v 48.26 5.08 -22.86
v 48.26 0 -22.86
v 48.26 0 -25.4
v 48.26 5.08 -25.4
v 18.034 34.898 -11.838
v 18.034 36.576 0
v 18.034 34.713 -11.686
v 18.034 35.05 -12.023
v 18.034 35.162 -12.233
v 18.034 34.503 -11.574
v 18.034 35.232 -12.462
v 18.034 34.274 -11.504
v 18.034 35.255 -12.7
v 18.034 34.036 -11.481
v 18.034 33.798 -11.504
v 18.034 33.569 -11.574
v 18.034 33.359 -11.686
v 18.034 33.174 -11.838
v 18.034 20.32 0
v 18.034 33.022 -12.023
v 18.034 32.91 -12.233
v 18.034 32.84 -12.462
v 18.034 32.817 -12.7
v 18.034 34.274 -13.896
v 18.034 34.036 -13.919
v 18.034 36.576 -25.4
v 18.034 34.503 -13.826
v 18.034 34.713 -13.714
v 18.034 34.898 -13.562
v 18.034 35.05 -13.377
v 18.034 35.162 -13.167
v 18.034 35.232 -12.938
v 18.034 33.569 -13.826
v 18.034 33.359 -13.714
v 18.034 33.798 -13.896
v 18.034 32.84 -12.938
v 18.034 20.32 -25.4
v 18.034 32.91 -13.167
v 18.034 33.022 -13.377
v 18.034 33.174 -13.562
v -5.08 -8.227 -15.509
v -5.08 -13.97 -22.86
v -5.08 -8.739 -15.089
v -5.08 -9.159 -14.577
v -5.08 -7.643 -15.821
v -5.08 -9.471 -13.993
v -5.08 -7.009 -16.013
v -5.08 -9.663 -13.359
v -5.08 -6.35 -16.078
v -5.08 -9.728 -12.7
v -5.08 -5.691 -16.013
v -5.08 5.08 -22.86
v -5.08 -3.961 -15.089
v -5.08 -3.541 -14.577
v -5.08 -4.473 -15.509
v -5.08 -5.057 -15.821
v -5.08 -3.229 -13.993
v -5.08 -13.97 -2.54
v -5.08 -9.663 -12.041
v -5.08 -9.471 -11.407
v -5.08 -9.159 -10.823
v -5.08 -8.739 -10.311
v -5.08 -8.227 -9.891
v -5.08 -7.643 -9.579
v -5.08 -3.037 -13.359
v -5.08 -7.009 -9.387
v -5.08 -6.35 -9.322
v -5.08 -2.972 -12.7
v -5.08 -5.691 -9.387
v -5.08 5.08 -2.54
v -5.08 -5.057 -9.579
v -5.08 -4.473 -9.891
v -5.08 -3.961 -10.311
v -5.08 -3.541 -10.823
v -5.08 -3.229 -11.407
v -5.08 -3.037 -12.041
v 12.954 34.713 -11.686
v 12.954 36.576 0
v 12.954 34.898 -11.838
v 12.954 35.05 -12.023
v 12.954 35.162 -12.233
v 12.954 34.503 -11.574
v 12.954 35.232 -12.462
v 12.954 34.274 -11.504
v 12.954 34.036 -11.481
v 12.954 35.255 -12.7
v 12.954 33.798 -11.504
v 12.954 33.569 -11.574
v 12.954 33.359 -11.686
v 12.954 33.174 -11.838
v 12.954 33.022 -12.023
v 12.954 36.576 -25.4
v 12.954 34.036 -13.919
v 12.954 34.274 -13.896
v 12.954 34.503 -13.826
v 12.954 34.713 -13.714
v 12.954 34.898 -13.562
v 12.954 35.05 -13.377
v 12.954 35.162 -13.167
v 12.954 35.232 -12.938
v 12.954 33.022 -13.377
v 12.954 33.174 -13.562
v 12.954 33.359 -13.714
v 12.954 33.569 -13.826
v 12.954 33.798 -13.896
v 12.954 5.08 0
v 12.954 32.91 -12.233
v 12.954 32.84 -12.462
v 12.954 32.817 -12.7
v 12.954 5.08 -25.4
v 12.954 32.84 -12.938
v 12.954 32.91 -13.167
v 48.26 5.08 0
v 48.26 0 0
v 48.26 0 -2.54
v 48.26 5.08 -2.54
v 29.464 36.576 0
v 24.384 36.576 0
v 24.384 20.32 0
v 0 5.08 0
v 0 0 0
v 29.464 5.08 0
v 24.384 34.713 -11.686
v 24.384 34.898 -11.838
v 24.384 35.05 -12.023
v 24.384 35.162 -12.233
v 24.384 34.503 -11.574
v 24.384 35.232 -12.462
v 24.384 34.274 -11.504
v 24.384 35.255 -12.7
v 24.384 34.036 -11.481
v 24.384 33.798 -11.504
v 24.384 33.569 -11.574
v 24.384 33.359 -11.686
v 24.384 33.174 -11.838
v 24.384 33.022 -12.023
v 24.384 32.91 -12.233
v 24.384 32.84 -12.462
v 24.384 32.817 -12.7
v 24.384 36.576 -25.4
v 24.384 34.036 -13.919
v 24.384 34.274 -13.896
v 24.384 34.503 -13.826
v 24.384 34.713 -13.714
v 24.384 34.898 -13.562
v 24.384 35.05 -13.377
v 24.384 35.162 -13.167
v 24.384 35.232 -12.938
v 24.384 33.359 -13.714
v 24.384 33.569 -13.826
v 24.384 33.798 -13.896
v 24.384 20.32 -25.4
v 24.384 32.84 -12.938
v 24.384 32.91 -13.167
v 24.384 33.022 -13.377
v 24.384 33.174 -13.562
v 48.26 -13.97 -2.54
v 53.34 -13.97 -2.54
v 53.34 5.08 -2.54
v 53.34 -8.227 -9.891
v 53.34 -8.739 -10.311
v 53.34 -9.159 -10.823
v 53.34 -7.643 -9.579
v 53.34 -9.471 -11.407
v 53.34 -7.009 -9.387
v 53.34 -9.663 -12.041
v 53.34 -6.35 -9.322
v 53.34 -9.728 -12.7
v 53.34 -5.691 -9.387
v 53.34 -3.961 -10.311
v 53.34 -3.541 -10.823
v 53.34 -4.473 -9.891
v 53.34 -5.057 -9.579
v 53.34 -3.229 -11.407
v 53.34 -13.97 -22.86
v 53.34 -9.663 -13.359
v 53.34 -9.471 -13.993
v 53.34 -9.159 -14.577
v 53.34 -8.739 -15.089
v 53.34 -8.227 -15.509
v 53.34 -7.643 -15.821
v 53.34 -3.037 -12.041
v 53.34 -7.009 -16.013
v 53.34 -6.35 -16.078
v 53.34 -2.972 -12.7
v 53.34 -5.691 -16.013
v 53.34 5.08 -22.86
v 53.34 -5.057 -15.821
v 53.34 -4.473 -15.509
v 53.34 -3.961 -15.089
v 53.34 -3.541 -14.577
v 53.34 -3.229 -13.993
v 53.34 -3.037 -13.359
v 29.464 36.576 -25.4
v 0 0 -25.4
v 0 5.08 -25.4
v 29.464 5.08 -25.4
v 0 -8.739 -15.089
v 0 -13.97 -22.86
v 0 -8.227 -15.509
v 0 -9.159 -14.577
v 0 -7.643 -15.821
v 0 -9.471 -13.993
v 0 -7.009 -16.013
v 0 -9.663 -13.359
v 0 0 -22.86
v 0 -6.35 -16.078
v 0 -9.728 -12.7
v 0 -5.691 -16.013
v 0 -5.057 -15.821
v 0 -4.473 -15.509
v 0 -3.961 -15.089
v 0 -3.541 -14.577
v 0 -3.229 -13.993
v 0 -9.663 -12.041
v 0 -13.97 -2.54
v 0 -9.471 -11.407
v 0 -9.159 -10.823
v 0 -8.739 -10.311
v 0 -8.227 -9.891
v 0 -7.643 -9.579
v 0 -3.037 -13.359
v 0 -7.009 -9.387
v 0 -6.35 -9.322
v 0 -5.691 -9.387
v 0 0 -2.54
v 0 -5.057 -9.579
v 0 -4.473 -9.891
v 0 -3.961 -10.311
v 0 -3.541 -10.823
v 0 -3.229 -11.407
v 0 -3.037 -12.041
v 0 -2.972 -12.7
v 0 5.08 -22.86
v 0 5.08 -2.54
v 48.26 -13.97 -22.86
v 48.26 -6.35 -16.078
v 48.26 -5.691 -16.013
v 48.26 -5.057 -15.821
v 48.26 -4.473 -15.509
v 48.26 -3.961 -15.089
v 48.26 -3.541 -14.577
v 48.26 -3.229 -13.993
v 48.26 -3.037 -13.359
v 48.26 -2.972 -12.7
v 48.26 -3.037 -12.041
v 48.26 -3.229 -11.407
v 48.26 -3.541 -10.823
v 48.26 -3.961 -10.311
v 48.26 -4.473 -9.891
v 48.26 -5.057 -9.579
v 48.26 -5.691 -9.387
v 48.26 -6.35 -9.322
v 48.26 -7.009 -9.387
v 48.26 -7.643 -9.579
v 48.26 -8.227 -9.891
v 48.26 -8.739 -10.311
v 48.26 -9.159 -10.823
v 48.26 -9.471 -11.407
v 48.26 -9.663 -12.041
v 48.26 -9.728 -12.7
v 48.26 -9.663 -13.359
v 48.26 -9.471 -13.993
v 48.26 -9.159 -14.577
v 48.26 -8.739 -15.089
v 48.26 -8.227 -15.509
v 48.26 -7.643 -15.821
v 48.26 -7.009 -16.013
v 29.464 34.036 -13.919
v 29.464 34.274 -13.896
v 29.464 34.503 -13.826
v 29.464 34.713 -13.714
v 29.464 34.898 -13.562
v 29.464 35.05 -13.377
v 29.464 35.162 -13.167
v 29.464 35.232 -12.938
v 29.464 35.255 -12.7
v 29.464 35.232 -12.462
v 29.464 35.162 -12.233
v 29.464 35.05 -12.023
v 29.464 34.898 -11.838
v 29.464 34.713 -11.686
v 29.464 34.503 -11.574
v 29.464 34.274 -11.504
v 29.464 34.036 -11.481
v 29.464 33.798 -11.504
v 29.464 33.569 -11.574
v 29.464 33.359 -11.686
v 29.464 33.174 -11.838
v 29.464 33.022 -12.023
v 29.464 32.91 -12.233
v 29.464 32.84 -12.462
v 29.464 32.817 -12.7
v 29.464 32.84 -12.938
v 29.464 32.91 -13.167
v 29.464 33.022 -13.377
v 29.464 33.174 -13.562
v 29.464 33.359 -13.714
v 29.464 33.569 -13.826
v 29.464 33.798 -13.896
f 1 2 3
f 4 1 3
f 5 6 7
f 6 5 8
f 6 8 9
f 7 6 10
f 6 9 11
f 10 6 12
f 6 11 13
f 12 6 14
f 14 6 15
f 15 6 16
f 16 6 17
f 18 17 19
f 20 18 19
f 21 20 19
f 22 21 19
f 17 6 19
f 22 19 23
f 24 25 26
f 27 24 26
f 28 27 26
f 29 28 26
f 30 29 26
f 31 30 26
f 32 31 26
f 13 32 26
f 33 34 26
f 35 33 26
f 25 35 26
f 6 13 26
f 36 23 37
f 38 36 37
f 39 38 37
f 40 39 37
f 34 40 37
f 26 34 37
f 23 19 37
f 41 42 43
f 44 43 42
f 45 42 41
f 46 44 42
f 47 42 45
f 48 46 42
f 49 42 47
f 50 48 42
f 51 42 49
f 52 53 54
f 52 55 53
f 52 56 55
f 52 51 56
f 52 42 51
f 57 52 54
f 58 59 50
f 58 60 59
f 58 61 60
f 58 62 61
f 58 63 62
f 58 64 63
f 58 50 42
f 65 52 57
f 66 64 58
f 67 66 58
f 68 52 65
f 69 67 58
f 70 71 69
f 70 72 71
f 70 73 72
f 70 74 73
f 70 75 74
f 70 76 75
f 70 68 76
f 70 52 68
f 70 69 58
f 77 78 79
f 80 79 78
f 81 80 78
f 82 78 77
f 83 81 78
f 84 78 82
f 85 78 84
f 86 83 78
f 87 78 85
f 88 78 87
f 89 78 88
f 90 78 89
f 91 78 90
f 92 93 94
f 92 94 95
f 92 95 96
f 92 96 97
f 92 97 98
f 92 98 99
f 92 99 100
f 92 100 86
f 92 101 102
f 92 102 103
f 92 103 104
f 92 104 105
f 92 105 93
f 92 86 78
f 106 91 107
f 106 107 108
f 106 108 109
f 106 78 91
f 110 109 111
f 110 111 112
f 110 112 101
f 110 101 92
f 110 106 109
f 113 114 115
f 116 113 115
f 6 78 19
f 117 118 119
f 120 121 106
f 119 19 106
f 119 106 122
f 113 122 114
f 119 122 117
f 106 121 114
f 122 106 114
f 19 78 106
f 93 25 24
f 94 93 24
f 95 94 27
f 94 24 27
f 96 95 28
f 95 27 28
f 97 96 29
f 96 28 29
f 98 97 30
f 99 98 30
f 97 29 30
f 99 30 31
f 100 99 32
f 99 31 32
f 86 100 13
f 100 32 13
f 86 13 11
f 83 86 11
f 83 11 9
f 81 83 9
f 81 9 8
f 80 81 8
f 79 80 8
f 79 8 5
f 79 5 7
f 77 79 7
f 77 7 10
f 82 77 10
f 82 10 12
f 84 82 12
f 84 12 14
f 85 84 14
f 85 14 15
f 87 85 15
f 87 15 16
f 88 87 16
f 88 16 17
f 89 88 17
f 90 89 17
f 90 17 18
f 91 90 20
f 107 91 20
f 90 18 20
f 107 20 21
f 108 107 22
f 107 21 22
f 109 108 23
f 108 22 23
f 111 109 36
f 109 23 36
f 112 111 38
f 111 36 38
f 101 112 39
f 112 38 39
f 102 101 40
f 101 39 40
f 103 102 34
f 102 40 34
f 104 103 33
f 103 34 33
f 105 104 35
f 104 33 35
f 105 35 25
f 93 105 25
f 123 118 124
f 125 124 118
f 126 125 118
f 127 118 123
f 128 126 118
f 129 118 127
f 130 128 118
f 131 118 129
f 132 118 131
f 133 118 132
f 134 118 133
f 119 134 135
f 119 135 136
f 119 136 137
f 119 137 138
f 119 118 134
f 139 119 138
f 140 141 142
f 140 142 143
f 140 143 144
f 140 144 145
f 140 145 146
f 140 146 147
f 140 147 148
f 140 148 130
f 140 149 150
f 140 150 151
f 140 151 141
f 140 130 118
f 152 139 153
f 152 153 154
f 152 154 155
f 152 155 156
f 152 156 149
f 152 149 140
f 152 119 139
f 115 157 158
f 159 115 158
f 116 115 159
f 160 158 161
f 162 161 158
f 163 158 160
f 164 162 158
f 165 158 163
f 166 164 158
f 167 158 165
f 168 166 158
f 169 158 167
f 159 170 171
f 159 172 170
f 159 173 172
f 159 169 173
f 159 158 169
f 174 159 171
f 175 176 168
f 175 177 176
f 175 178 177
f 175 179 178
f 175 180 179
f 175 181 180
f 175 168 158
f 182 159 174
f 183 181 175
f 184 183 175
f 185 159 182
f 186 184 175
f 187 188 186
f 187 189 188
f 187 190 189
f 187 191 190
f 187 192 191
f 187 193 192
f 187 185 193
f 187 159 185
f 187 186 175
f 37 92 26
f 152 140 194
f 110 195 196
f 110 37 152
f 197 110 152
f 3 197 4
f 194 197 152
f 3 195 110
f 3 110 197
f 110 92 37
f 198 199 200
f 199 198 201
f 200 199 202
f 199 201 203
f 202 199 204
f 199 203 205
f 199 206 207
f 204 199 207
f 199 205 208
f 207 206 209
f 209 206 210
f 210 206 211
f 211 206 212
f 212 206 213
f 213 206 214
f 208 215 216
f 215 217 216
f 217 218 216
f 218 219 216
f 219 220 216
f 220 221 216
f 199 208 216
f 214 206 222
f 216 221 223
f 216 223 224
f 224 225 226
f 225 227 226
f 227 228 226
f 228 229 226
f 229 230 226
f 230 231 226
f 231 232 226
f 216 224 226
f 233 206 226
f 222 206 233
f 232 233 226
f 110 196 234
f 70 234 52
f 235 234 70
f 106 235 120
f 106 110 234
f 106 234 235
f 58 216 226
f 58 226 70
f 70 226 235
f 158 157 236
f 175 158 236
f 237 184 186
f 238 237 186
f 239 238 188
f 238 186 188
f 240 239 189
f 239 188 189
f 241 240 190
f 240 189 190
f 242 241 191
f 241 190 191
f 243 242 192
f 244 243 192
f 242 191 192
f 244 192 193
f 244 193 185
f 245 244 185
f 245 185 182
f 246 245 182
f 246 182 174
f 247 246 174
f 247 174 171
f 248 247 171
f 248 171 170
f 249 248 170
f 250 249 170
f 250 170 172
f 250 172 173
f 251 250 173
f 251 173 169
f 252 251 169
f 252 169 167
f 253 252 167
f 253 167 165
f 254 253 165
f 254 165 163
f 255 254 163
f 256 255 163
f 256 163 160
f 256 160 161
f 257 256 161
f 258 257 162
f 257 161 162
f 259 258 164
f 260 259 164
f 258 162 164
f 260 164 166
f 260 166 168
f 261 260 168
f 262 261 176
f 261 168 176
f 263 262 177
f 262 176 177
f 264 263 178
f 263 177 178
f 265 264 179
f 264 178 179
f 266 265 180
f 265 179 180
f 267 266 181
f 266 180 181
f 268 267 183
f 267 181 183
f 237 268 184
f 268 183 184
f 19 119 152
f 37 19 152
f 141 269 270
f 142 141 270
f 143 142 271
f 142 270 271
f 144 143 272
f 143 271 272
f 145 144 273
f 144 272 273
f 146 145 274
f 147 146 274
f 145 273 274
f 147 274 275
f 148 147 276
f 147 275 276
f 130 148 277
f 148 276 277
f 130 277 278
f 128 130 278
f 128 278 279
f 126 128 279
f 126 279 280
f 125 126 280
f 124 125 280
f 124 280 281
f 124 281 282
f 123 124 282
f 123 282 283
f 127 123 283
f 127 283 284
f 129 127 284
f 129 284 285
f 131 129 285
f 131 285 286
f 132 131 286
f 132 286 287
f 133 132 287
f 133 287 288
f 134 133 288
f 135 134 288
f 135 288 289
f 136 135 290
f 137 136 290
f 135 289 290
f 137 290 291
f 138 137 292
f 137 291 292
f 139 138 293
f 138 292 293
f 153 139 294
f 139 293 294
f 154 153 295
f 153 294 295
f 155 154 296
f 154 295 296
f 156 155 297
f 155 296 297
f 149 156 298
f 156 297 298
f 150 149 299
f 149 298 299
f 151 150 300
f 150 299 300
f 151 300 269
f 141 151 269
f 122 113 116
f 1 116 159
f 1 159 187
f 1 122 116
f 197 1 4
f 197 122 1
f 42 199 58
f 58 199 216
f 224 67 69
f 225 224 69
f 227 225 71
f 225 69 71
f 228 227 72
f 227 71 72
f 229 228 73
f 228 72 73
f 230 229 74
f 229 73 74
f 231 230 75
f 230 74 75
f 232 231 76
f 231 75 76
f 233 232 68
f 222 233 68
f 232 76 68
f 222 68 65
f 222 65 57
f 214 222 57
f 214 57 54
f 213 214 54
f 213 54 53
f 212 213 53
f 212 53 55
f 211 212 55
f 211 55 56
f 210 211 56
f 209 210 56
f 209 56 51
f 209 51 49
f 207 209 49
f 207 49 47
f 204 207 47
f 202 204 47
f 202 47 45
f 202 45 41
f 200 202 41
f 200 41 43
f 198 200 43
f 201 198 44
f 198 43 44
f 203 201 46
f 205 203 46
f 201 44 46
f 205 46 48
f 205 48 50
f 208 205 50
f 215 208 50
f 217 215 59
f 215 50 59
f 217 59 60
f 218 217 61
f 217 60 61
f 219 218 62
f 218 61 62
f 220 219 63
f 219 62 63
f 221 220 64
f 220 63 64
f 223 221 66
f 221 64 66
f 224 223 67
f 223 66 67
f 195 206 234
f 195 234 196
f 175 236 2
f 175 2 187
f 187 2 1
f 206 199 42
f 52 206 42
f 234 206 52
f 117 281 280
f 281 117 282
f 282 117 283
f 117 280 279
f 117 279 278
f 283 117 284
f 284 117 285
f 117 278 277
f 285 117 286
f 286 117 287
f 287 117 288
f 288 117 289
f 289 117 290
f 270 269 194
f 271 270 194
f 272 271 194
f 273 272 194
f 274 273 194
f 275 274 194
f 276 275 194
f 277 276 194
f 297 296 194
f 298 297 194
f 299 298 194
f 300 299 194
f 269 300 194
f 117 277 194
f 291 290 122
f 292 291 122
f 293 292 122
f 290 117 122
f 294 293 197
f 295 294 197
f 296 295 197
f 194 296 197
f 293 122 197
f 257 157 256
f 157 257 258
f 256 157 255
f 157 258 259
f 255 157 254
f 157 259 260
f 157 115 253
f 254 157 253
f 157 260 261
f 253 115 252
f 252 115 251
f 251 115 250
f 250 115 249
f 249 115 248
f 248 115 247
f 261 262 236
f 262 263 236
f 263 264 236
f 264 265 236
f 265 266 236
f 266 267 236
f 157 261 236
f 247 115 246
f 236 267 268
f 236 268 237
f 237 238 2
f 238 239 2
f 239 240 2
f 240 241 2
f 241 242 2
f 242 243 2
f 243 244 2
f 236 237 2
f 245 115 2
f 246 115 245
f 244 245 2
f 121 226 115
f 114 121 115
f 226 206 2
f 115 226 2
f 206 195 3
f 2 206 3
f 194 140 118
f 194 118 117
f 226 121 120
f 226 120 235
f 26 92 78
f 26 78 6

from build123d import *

# Parameters (mm, degrees)
SKETCH1_W           = 48.26
SKETCH1_H           = 25.4
BOSS_EXTRUDE1_DEPTH = 5.08
SKETCH3_W           = 5.08
SKETCH3_H           = 25.4
BOSS_EXTRUDE2_DEPTH = 31.496
SKETCH4_R           = 1.2192
CUT_EXTRUDE2_DEPTH  = 30.464
SKETCH5_W           = 25.4
SKETCH5_H           = 15.24
BOSS_EXTRUDE3_DEPTH = 16.51
SKETCH6_W           = 20.32
SKETCH6_H           = 19.05
BOSS_EXTRUDE4_DEPTH = 5.08
SKETCH7_W           = 20.32
SKETCH7_H           = 19.05
BOSS_EXTRUDE5_DEPTH = 5.08
SKETCH8_R           = 3.3782
CUT_EXTRUDE3_DEPTH  = 6.35
SKETCH9_R           = 3.3782
CUT_EXTRUDE4_DEPTH  = 6.35


with BuildPart() as part:
    # Sketch1 → Boss-Extrude1 (new body)
    with BuildSketch(Plane(origin=(0, 0, 0), x_dir=(1, 0, 0), z_dir=(0, 1, 0))):
        with Locations((24.13, 12.7)):
            Rectangle(SKETCH1_W, SKETCH1_H)
    extrude(amount=BOSS_EXTRUDE1_DEPTH)

    # Sketch3 → Boss-Extrude2 (add)
    with BuildSketch(Plane(origin=(0, 5.08, 0), x_dir=(1, 0, 0), z_dir=(0, 1, 0))):
        with Locations((26.924, 12.7)):
            Rectangle(SKETCH3_W, SKETCH3_H)
        with Locations((15.494, 12.7)):
            Rectangle(SKETCH3_W, SKETCH3_H)
    extrude(amount=BOSS_EXTRUDE2_DEPTH)

    # Sketch4 → Cut-Extrude2 (cut, through all)
    with BuildSketch(Plane(origin=(29.464, 0, 0), x_dir=(0, 0, -1), z_dir=(1, 0, 0))):
        with Locations((12.7, 34.036)):
            Circle(SKETCH4_R)
    extrude(amount=-CUT_EXTRUDE2_DEPTH, mode=Mode.SUBTRACT)

    # Sketch5 → Boss-Extrude3 (add)
    with BuildSketch(Plane(origin=(29.464, 0, 0), x_dir=(0, 0, -1), z_dir=(1, 0, 0))):
        with Locations((12.7, 12.7)):
            Rectangle(SKETCH5_W, SKETCH5_H)
    extrude(amount=-BOSS_EXTRUDE3_DEPTH)

    # Sketch6 → Boss-Extrude4 (add)
    with BuildSketch(Plane.ZY):
        with Locations((-12.7, -4.445)):
            Rectangle(SKETCH6_W, SKETCH6_H)
    extrude(amount=BOSS_EXTRUDE4_DEPTH)

    # Sketch7 → Boss-Extrude5 (add)
    with BuildSketch(Plane(origin=(48.26, 0, 0), x_dir=(0, 0, -1), z_dir=(1, 0, 0))):
        with Locations((12.7, -4.445)):
            Rectangle(SKETCH7_W, SKETCH7_H)
    extrude(amount=BOSS_EXTRUDE5_DEPTH)

    # Sketch8 → Cut-Extrude3 (cut)
    with BuildSketch(Plane(origin=(53.34, 0, 0), x_dir=(0, 0, -1), z_dir=(1, 0, 0))):
        with Locations((12.7, -6.35)):
            Circle(SKETCH8_R)
    extrude(amount=-CUT_EXTRUDE3_DEPTH, mode=Mode.SUBTRACT)

    # Sketch9 → Cut-Extrude4 (cut)
    with BuildSketch(Plane.ZY.offset(5.08)):
        with Locations((-12.7, -6.35)):
            Circle(SKETCH9_R)
    extrude(amount=-CUT_EXTRUDE4_DEPTH, mode=Mode.SUBTRACT)


solid = part.part
